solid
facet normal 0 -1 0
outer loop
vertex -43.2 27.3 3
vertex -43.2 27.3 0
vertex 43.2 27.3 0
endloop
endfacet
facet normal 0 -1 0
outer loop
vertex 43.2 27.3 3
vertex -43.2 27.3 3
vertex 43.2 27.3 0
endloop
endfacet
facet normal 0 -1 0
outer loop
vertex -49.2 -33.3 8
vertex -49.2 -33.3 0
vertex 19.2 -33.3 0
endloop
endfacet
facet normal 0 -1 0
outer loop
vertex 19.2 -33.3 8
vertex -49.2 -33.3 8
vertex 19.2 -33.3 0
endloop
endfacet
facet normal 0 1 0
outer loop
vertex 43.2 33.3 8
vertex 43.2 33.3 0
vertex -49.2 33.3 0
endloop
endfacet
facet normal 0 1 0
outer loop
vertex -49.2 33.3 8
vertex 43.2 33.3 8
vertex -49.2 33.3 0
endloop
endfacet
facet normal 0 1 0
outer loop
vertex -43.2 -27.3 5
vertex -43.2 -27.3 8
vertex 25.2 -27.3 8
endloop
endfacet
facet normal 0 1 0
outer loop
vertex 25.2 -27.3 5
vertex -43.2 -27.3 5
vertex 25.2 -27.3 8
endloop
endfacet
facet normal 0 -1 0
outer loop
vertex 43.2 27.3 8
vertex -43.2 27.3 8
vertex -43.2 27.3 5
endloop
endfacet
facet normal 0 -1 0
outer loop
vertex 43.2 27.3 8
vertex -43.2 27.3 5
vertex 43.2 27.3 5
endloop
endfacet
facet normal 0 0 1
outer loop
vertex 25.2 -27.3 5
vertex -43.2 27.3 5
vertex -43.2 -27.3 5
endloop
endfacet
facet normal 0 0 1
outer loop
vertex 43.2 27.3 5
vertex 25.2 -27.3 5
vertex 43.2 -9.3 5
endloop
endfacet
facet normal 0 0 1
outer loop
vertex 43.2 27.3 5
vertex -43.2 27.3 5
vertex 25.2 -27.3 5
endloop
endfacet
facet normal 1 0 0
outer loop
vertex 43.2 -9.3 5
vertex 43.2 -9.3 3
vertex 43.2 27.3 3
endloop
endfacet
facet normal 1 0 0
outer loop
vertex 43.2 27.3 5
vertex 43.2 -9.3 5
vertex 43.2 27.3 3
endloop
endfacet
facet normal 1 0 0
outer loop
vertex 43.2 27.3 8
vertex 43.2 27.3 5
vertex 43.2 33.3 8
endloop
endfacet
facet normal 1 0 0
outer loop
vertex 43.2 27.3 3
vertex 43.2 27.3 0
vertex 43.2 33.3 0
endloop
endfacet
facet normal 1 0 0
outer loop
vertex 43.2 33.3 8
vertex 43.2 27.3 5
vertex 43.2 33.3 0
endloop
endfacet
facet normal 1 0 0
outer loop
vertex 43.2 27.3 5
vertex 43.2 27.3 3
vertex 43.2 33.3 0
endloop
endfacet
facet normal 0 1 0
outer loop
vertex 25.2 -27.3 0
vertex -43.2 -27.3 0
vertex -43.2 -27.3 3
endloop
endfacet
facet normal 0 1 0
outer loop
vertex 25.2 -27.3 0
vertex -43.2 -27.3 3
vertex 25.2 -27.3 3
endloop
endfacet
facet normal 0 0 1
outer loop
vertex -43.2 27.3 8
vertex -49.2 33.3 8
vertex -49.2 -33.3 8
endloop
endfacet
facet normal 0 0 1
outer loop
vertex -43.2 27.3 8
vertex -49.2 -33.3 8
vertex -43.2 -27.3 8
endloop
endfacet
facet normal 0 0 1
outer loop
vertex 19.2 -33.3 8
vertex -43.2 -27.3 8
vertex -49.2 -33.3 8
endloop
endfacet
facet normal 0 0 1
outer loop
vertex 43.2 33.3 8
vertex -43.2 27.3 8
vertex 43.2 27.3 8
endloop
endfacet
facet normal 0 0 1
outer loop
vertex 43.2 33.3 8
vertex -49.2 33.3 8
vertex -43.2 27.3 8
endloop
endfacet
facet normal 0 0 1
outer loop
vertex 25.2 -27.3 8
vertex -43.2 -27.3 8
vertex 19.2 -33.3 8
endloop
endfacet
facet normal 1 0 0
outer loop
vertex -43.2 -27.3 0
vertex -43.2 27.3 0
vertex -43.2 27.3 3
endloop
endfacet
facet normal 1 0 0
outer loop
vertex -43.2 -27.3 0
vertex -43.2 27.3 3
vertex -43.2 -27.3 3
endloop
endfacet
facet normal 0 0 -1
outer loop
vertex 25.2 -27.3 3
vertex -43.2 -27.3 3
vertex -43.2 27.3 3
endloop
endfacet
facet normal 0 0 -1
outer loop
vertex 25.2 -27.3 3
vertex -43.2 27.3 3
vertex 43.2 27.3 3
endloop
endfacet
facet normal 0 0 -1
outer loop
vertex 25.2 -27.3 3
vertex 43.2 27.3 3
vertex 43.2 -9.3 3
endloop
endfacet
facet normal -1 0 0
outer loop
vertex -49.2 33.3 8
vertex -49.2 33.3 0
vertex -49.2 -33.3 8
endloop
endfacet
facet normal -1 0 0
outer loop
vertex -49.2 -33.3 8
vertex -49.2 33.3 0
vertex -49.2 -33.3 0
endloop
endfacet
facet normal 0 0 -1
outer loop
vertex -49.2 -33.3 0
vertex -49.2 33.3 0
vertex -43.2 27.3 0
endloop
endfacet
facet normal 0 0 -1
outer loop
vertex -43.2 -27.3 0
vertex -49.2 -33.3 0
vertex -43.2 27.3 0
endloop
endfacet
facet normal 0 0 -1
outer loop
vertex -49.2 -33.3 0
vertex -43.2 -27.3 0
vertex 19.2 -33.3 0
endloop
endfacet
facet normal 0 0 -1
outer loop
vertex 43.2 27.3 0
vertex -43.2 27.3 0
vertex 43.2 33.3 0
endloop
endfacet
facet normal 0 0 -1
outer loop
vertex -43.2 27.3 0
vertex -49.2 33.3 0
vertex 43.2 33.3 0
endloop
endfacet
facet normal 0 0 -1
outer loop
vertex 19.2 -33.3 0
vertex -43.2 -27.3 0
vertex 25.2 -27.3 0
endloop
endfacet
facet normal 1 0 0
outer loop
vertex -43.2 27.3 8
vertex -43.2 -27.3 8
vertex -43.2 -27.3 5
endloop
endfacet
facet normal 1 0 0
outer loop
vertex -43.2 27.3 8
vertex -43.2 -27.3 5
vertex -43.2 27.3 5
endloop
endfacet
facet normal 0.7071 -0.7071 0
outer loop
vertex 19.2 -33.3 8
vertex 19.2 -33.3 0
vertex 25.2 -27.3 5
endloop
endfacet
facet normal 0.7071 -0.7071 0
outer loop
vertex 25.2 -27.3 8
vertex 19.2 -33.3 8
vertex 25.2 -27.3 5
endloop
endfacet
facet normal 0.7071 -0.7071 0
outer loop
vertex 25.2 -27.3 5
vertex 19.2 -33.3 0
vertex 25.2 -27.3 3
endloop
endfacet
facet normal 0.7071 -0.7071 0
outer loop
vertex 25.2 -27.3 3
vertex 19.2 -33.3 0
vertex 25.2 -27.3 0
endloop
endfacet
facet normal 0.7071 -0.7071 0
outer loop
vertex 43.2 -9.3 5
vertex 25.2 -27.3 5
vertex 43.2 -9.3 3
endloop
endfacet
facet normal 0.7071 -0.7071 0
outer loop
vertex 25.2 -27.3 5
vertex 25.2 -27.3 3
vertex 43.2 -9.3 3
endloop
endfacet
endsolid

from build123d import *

# Parameters (mm, degrees)
F0_W     = 86.4
F0_H     = 54.6
F1_DEPTH = 8
F2_W     = 86.4
F2_H     = 54.6
F3_DEPTH = 3
F4_W     = 86.4
F4_H     = 54.6
F5_DEPTH = 3
F7_DEPTH = 25


with BuildPart() as f1:
    # F0 (on Top) → F1 (new body)
    with BuildSketch(Plane.XY):
        Polygon((-43.2, -27.3), (-43.2, 27.3), (43.2, 27.3), (43.2, 33.3), (-49.2, 33.3), (-49.2, -33.3), (43.2, -33.3), (43.2, -27.3), align=None)
        Rectangle(F0_W, F0_H)
    extrude(amount=F1_DEPTH)

    # F2 (on face) → F3 (cut)
    with BuildSketch(Plane.XY.offset(8)):
        Rectangle(F2_W, F2_H)
    extrude(amount=-F3_DEPTH, mode=Mode.SUBTRACT)

    # F4 (on face) → F5 (cut)
    with BuildSketch(Plane(origin=(0, 0, 0), x_dir=(1, 0, 0), z_dir=(0, 0, -1))):
        Rectangle(F4_W, F4_H)
    extrude(amount=-F5_DEPTH, mode=Mode.SUBTRACT)

    # F6 (on face) → F7 (cut)
    with BuildSketch(Plane(origin=(0, 0, 0), x_dir=(1, 0, 0), z_dir=(0, 0, -1))):
        Polygon((43.2, 33.3), (19.2, 33.3), (43.2, 9.3), align=None)
    extrude(amount=-F7_DEPTH, mode=Mode.SUBTRACT)


solid = f1.part
